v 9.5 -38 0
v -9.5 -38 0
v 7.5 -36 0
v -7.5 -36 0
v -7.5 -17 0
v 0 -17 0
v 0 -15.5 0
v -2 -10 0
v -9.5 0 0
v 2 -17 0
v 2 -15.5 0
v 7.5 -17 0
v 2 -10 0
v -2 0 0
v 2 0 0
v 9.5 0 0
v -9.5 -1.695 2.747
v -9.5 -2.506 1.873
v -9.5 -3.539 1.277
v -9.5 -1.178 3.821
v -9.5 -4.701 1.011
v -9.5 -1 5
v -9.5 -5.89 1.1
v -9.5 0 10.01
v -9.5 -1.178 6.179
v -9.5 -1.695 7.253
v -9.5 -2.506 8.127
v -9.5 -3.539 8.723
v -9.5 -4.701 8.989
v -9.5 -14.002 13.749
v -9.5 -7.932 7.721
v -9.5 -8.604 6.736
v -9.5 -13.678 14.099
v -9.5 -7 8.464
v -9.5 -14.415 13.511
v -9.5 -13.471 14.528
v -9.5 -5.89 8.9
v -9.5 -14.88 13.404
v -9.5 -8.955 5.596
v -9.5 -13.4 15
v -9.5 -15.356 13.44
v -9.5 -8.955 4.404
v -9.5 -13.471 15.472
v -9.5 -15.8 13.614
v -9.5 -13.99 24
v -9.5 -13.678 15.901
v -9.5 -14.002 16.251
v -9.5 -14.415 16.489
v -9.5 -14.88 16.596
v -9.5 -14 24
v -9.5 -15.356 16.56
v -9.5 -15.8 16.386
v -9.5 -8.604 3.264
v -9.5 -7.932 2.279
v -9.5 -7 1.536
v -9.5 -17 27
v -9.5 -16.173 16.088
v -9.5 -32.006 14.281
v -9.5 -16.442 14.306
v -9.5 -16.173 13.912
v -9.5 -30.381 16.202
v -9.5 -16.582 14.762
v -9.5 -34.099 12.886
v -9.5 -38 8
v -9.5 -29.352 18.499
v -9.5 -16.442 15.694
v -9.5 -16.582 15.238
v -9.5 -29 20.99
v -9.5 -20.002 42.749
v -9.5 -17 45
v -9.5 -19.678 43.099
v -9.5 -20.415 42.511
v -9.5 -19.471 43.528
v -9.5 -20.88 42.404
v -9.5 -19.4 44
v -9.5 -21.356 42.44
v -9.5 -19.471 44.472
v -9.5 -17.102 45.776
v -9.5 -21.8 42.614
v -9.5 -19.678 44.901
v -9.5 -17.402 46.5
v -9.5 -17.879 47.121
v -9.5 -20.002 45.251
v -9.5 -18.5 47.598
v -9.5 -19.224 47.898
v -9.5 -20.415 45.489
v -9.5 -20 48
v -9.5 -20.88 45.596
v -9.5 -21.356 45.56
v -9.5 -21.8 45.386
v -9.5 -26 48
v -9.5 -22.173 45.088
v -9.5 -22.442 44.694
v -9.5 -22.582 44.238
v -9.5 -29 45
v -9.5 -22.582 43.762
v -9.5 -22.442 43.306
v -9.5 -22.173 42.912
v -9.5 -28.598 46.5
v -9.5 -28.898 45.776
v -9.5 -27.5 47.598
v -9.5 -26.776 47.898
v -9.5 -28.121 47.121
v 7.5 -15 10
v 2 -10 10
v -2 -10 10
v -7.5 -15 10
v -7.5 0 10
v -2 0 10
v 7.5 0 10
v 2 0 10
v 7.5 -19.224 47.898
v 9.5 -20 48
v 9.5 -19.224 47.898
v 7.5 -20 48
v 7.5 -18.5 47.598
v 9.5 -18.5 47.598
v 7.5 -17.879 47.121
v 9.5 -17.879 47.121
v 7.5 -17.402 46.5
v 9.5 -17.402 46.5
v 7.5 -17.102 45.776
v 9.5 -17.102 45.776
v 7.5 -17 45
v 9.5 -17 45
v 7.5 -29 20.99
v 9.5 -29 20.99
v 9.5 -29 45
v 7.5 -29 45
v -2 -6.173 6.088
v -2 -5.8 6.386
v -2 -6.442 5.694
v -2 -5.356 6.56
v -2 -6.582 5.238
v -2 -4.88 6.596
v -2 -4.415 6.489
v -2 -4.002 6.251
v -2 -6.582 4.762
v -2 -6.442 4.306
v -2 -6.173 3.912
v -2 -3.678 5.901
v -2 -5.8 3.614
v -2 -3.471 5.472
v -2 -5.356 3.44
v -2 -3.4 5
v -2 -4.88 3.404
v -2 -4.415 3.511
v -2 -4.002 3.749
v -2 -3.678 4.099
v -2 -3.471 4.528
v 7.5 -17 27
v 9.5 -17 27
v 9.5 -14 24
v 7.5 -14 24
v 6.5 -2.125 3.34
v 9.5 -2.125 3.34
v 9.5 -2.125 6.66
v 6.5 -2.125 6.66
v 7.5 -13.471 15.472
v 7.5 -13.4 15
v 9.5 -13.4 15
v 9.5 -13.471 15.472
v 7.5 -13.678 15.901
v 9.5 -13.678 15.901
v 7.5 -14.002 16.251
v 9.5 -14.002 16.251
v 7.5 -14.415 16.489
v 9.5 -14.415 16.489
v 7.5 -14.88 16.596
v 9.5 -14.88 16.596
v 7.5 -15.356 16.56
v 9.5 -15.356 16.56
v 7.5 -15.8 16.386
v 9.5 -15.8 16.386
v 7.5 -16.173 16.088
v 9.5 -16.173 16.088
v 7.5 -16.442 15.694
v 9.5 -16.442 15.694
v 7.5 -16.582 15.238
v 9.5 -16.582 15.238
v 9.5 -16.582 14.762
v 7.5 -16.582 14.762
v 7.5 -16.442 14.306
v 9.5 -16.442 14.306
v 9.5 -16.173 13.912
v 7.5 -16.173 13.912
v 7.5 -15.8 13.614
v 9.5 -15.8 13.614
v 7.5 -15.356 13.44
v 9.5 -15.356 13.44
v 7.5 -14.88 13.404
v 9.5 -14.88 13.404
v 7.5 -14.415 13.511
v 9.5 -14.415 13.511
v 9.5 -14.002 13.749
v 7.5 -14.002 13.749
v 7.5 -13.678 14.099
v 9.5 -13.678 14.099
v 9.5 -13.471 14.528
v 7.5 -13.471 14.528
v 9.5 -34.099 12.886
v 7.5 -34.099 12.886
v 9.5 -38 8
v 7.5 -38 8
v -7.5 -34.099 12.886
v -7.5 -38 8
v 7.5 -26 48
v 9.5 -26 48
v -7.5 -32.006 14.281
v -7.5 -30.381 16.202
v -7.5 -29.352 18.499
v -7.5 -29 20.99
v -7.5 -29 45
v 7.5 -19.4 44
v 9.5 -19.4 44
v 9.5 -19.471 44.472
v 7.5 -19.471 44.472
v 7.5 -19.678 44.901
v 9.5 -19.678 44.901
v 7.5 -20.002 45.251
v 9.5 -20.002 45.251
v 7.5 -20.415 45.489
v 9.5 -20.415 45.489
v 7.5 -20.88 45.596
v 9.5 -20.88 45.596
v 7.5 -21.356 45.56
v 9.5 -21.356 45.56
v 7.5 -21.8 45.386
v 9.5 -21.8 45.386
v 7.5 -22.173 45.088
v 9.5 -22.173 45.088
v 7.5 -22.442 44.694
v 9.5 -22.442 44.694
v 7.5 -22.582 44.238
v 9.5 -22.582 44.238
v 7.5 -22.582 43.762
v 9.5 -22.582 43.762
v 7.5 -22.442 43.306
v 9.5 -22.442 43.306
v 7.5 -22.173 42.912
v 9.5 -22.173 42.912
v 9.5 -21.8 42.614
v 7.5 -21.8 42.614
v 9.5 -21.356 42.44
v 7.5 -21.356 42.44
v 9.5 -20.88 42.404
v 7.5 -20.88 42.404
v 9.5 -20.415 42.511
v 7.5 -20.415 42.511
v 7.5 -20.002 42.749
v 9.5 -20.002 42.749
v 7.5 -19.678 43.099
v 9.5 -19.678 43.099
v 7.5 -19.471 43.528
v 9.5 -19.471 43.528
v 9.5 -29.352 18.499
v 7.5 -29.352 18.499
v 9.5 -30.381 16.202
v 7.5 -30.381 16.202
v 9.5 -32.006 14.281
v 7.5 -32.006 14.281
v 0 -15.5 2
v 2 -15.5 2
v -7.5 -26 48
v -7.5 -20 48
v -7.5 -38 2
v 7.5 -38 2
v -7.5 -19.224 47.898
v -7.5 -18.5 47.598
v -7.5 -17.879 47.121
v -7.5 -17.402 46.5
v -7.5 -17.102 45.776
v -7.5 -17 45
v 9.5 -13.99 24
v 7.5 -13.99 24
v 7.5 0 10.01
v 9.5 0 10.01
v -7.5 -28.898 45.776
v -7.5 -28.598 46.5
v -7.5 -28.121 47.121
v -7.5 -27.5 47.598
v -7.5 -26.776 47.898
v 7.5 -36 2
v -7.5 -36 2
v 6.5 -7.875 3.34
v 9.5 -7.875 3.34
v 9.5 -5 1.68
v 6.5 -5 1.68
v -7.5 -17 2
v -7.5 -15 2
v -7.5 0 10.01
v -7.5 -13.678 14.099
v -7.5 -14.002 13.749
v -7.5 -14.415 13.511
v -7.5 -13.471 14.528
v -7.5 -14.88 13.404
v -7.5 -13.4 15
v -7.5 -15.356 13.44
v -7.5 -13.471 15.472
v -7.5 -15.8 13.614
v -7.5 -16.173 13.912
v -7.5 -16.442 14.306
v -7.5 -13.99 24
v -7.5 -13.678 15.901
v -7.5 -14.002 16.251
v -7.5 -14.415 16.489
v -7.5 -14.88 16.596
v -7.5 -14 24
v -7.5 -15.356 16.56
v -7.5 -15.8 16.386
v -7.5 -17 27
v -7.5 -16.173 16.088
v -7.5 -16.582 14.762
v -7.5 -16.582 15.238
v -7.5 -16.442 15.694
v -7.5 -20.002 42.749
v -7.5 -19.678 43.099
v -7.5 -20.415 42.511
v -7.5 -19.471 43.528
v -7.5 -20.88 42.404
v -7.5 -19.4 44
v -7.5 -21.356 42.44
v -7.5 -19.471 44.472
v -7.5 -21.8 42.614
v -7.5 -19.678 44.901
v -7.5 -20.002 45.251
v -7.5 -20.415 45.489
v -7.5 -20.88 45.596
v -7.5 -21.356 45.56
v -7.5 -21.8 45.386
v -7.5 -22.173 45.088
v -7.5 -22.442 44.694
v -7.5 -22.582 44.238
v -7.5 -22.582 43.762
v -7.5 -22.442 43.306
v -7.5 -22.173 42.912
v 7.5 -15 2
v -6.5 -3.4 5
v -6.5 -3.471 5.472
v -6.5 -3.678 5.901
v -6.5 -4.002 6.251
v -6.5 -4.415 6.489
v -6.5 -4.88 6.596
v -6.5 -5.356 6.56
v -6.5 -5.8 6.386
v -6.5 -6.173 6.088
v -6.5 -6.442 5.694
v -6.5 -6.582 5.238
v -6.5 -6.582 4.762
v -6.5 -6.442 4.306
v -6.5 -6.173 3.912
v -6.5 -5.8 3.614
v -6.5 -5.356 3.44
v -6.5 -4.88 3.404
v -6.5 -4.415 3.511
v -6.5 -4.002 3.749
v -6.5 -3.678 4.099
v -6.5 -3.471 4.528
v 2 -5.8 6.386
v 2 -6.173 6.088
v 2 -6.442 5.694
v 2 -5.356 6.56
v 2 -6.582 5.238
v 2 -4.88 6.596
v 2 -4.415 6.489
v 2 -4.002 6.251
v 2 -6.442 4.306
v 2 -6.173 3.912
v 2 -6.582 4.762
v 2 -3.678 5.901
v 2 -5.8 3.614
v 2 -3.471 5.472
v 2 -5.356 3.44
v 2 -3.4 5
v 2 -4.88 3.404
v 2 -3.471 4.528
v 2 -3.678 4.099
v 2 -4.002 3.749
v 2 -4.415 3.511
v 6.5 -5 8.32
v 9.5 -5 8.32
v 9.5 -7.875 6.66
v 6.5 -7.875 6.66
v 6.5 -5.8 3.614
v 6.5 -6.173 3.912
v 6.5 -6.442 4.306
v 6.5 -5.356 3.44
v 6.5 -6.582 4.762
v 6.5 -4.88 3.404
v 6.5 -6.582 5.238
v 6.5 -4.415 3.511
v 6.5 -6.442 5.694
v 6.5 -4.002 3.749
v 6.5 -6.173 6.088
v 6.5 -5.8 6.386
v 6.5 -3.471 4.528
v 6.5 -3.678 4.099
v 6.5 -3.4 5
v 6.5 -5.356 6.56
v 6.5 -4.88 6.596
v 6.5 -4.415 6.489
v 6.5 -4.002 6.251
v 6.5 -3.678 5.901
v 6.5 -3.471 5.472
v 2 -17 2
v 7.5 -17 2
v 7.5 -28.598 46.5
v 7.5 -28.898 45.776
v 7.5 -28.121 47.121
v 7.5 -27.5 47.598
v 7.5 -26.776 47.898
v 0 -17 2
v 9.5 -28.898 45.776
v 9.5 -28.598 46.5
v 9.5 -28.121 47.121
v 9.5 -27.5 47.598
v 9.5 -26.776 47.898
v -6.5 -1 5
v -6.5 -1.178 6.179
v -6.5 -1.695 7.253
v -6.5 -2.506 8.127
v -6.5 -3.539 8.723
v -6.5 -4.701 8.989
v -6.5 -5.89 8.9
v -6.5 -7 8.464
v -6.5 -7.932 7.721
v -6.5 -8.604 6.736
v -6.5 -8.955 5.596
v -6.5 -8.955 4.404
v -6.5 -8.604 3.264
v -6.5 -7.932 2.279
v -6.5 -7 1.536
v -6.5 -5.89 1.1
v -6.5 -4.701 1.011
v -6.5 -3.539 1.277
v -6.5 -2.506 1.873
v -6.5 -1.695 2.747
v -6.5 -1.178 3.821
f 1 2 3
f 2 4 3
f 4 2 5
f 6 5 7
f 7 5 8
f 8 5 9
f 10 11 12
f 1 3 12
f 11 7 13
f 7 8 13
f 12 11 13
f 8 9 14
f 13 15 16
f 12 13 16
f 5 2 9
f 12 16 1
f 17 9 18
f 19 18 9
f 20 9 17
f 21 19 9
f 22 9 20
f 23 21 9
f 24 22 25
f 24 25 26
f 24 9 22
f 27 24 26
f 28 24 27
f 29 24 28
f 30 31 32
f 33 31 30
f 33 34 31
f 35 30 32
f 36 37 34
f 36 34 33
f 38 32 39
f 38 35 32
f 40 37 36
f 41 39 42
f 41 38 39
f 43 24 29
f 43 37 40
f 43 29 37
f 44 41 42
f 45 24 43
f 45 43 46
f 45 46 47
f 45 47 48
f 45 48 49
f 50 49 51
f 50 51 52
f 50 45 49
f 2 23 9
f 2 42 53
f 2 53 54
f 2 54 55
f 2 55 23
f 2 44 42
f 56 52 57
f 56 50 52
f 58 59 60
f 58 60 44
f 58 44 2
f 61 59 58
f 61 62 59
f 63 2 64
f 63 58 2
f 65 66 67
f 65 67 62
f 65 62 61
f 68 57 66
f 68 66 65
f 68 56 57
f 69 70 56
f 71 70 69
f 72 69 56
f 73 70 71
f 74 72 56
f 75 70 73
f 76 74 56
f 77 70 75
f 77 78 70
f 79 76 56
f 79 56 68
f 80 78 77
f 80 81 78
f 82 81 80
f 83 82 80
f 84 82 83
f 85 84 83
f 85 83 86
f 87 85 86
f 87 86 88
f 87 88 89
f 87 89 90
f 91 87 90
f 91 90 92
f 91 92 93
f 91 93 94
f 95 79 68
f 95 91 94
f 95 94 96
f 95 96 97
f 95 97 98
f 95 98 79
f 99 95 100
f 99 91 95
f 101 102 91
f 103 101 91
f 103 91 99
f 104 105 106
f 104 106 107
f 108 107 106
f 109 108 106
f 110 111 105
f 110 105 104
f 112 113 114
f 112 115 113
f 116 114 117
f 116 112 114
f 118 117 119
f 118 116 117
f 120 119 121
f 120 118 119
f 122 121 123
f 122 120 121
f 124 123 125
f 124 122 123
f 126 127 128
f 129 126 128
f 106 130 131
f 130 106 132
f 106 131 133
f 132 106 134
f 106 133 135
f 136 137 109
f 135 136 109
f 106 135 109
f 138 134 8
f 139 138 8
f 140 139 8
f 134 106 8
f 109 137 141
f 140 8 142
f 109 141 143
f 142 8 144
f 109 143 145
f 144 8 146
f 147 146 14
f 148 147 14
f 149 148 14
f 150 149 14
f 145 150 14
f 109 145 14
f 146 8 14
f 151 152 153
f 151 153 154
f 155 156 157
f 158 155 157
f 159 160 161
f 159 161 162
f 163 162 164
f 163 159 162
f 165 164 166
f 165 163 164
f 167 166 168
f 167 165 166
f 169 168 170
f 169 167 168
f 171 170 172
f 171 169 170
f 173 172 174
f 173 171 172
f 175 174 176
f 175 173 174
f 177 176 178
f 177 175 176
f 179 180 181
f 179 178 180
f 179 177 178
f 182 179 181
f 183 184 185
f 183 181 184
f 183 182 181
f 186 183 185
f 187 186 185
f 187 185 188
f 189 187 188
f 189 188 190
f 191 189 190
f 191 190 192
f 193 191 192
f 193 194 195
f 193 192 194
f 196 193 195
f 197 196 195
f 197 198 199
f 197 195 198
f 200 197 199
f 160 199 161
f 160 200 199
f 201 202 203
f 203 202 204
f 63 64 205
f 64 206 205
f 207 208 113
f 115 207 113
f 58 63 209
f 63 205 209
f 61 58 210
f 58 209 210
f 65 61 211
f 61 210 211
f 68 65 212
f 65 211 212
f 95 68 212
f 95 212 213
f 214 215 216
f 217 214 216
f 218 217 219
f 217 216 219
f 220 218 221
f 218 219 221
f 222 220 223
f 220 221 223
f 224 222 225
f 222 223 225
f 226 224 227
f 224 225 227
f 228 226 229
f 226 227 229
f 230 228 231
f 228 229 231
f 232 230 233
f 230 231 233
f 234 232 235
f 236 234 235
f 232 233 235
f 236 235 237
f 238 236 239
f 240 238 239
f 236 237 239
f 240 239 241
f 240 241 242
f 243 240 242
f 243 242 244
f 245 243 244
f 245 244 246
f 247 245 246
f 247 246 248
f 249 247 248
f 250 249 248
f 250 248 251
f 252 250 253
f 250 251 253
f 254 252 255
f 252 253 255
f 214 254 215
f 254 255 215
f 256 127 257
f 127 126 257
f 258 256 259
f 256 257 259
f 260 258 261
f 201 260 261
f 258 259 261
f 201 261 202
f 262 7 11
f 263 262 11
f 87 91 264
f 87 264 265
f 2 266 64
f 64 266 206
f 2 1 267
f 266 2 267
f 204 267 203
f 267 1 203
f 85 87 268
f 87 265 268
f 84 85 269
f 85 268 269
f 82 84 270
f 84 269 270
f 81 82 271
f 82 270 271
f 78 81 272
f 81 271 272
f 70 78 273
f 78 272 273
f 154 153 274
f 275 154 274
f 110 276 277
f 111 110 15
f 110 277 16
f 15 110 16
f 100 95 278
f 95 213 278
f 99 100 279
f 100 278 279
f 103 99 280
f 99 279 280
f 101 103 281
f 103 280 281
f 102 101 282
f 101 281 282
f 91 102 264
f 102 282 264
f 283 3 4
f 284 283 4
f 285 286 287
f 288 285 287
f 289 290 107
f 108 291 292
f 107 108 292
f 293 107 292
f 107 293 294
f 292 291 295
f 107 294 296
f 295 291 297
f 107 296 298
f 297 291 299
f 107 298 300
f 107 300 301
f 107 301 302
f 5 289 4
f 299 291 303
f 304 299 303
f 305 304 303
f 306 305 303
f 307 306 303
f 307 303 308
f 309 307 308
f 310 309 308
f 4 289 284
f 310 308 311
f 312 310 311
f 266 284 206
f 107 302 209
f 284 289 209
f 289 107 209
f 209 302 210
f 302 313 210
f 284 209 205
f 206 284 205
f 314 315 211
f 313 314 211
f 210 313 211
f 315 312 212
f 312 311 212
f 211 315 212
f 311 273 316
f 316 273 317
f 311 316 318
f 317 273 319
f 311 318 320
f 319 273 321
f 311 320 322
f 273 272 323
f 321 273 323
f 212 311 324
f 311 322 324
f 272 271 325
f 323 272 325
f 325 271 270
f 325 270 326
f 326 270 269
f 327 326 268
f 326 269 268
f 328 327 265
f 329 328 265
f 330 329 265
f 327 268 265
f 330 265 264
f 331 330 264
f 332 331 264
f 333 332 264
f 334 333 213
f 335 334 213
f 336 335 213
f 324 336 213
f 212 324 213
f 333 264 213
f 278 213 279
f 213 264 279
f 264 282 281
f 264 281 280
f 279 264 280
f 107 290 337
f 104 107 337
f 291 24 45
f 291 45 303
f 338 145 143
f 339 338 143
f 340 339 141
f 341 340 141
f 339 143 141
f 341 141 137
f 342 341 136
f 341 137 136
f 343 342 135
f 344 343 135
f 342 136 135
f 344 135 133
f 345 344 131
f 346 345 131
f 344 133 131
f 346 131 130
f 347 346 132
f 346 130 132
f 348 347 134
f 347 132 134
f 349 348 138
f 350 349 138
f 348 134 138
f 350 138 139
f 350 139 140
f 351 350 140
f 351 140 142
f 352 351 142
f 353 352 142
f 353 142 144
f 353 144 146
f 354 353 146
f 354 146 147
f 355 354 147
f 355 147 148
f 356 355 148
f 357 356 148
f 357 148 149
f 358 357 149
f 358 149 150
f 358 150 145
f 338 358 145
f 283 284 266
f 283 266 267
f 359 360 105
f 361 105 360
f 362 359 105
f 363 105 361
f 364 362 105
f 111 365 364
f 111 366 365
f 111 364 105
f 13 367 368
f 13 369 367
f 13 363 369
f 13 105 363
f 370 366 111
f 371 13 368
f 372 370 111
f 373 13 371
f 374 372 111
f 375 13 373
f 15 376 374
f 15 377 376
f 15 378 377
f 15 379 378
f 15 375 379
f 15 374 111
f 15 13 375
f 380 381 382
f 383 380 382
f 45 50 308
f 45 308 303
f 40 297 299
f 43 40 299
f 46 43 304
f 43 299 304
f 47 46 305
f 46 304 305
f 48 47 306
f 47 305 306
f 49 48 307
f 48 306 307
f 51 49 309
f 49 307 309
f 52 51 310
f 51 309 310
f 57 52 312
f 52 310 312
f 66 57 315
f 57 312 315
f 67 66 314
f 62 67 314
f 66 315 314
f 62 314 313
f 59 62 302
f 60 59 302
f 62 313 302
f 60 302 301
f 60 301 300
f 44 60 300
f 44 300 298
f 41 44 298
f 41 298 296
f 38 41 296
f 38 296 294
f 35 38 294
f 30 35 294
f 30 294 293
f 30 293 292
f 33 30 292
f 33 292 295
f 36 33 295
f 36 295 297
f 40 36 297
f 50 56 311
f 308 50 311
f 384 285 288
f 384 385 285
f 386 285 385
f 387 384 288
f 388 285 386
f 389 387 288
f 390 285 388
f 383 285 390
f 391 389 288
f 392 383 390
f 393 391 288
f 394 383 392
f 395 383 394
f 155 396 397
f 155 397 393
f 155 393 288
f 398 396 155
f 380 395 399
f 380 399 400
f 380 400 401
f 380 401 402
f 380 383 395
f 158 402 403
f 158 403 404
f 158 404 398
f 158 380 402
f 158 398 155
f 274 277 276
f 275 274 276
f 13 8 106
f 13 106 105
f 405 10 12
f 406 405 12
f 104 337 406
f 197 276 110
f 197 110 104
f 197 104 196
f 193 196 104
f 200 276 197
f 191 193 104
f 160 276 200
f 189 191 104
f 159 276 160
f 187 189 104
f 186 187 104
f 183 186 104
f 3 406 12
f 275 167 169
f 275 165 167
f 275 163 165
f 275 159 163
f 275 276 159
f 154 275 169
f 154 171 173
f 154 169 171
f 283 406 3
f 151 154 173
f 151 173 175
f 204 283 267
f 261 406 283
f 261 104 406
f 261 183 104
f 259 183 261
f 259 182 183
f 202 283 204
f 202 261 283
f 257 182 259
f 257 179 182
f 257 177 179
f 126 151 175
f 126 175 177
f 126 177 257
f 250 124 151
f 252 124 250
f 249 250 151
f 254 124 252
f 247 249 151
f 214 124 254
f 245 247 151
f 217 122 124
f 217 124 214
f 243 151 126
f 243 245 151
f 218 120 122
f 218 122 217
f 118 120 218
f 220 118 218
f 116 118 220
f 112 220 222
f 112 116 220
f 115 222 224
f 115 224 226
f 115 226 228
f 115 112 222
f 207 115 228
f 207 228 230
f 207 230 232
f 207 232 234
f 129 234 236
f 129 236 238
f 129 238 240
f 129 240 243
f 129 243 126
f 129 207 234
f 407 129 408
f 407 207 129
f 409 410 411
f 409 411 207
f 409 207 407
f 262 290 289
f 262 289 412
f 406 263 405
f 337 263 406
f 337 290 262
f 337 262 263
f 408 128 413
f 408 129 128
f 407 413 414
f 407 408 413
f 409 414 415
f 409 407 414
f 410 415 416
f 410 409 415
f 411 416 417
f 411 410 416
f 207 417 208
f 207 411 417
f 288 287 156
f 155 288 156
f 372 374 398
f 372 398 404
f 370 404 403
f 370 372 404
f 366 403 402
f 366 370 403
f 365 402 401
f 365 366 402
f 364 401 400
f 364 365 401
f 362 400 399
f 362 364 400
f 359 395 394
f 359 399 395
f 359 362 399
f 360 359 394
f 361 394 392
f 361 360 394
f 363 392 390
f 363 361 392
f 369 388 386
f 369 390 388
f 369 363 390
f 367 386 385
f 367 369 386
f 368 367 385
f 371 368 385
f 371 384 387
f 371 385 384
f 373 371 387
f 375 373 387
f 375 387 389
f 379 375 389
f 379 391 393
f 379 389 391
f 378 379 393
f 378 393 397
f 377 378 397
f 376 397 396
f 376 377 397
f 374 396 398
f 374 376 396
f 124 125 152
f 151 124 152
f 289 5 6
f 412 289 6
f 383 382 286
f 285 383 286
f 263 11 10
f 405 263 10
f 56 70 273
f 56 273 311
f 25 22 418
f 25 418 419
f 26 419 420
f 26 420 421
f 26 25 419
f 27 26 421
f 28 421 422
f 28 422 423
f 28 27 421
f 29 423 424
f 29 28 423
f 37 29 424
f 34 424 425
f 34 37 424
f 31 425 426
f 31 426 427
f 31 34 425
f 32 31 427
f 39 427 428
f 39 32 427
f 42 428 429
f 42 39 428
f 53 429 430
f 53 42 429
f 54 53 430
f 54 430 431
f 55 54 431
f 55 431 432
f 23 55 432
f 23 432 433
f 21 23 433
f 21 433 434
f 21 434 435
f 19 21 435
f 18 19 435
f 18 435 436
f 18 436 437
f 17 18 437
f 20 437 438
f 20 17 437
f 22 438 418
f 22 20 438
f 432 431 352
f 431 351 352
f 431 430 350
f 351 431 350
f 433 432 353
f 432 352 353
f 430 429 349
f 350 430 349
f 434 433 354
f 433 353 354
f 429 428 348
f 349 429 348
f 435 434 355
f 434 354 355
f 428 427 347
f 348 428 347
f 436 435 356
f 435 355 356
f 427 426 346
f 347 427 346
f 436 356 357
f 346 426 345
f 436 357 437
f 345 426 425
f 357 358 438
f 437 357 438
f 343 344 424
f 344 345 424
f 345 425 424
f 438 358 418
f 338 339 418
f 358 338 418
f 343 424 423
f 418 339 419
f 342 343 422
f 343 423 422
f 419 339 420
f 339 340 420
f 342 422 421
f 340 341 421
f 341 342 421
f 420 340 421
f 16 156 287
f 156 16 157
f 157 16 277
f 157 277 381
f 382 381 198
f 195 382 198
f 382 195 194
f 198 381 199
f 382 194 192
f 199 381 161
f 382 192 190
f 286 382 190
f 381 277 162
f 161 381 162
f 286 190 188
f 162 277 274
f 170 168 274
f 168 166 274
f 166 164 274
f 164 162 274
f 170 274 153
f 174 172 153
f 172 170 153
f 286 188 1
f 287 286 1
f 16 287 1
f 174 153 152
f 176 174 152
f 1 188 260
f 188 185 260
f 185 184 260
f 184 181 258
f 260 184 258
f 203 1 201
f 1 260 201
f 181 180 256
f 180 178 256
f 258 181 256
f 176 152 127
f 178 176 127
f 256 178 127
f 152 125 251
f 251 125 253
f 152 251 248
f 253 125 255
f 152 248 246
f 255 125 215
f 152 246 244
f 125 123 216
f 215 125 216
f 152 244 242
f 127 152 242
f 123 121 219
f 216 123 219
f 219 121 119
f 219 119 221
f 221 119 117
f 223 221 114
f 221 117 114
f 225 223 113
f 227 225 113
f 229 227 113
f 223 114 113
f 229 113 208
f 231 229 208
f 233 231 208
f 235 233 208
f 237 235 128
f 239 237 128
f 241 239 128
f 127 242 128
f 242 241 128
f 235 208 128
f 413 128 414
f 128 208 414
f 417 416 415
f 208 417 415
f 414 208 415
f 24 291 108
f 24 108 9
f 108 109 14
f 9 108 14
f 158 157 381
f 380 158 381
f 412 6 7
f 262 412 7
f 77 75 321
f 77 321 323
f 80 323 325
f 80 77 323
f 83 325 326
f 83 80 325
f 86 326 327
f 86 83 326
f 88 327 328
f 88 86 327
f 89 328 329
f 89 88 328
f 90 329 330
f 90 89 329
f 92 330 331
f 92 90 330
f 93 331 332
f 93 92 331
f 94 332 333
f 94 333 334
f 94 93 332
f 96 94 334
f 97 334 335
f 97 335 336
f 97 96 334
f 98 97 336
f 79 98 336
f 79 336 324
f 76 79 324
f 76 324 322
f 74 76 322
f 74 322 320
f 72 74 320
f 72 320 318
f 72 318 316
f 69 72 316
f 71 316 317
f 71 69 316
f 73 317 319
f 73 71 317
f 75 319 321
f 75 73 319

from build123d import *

# Parameters (mm, degrees)
SKETCH001_W          = 17.4
SKETCH001_H          = 38
PAD001_DEPTH         = 2
SKETCH002_R          = 1.6
PAD_DEPTH            = 2
SKETCH005_R          = 1.6
PAD002_DEPTH         = 2
PAD003_DEPTH         = 10
SKETCH006_W          = 4
SKETCH006_H          = 10
POCKET001_DEPTH      = 0.001
POCKET001_DEPTH_BACK = 48.001
SKETCH007_R          = 1.6
POCKET_DEPTH         = 9.501
POCKET_DEPTH_BACK    = 9.501
SKETCH008_R          = 4
POCKET002_DEPTH      = 3
POCKET003_DEPTH      = 3
SKETCH004_R          = 1.6
POCKET004_DEPTH      = 9.501
POCKET004_DEPTH_BACK = 9.501
CHAMFER_SIZE         = 13.99
CHAMFER001_SIZE      = 3
FILLET_R             = 8.99
CHAMFER002_SIZE      = 4
FILLET001_R          = 3


with BuildPart() as part:
    # Sketch001 → Pad001 (new body)
    with BuildSketch(Plane.XY):
        with Locations((0, -19)):
            Rectangle(SKETCH001_W, SKETCH001_H)
        Polygon((7.5, -17), (7.5, -36), (-7.5, -36), (-7.5, -17), (0, -17), (0, -15.5), (2, -15.5), (2, -17), align=None, mode=Mode.SUBTRACT)
    extrude(amount=PAD001_DEPTH)

    # Sketch002 (on DatumPlane) → Pad (join)
    with BuildSketch(Plane.YZ.offset(-9.5)):
        Polygon((0, 24), (0, 0), (-38, 0), (-38, 12), (-29, 12), (-29, 48), (-17, 48), (-17, 24), align=None)
        with Locations((-21, 44)):
            Circle(SKETCH002_R, mode=Mode.SUBTRACT)
    extrude(amount=PAD_DEPTH)

    # Sketch005 (on DatumPlane) → Pad002 (join)
    with BuildSketch(Plane.YZ.offset(9.5)):
        Polygon((0, 24), (0, 0), (-38, 0), (-38, 12), (-29, 12), (-29, 48), (-17, 48), (-17, 24), align=None)
        with Locations((-21, 44)):
            Circle(SKETCH005_R, mode=Mode.SUBTRACT)
    extrude(amount=-PAD002_DEPTH)

    # Sketch → Pad003 (join)
    with BuildSketch(Plane.XY):
        Polygon((-2, 0), (-8.7, 0), (-8.7, -15), (8.7, -15), (8.7, 0), (2, 0), (2, -10), (-2, -10), align=None)
    extrude(amount=PAD003_DEPTH)

    # Sketch006 → Pocket001 (cut, two sides)
    with BuildSketch(Plane.XY) as pocket001_sk:
        with Locations((0, -5)):
            Rectangle(SKETCH006_W, SKETCH006_H)
    extrude(amount=-POCKET001_DEPTH, mode=Mode.SUBTRACT)
    extrude(pocket001_sk.sketch, amount=POCKET001_DEPTH_BACK, mode=Mode.SUBTRACT)

    # Sketch007 → Pocket (cut, two sides)
    with BuildSketch(Plane.YZ) as pocket_sk:
        with Locations((-5, 5)):
            Circle(SKETCH007_R)
    extrude(amount=-POCKET_DEPTH, mode=Mode.SUBTRACT)
    extrude(pocket_sk.sketch, amount=POCKET_DEPTH_BACK, mode=Mode.SUBTRACT)

    # Sketch008 (on DatumPlane) → Pocket002 (cut)
    with BuildSketch(Plane.YZ.offset(-9.5)):
        with Locations((-5, 5)):
            Circle(SKETCH008_R)
    extrude(amount=POCKET002_DEPTH, mode=Mode.SUBTRACT)

    # Sketch009 (on DatumPlane) → Pocket003 (cut)
    with BuildSketch(Plane.YZ.offset(9.5)):
        Polygon((-2.125, 3.340118), (-2.125, 6.659882), (-5, 8.319764), (-7.875, 6.659882), (-7.875, 3.340118), (-5, 1.680236), align=None)
    extrude(amount=-POCKET003_DEPTH, mode=Mode.SUBTRACT)

    # Sketch004 → Pocket004 (cut, two sides)
    with BuildSketch(Plane.YZ) as pocket004_sk:
        with Locations((-15, 15)):
            Circle(SKETCH004_R)
    extrude(amount=-POCKET004_DEPTH, mode=Mode.SUBTRACT)
    extrude(pocket004_sk.sketch, amount=POCKET004_DEPTH_BACK, mode=Mode.SUBTRACT)

    # Chamfer
    chamfer_edges = [part.edges().sort_by_distance(p)[0] for p in [
        (-8.5, 0, 24),
        (8.5, 0, 24),
    ]]
    chamfer(chamfer_edges, length=CHAMFER_SIZE)

    # Chamfer001
    chamfer001_edges = [part.edges().sort_by_distance(p)[0] for p in [
        (8.5, -17, 24),
        (-8.5, -17, 24),
    ]]
    chamfer(chamfer001_edges, length=CHAMFER001_SIZE)

    # Fillet
    fillet_edges = [part.edges().sort_by_distance(p)[0] for p in [
        (-8.5, -29, 12),
        (8.5, -29, 12),
    ]]
    fillet(fillet_edges, radius=FILLET_R)

    # Chamfer002
    chamfer002_edges = [part.edges().sort_by_distance(p)[0] for p in [
        (-8.5, -38, 12),
        (8.5, -38, 12),
    ]]
    chamfer(chamfer002_edges, length=CHAMFER002_SIZE)

    # Fillet001
    fillet001_edges = [part.edges().sort_by_distance(p)[0] for p in [
        (-8.5, -29, 48),
        (8.5, -29, 48),
        (8.5, -17, 48),
        (-8.5, -17, 48),
    ]]
    fillet(fillet001_edges, radius=FILLET001_R)


solid = part.part
